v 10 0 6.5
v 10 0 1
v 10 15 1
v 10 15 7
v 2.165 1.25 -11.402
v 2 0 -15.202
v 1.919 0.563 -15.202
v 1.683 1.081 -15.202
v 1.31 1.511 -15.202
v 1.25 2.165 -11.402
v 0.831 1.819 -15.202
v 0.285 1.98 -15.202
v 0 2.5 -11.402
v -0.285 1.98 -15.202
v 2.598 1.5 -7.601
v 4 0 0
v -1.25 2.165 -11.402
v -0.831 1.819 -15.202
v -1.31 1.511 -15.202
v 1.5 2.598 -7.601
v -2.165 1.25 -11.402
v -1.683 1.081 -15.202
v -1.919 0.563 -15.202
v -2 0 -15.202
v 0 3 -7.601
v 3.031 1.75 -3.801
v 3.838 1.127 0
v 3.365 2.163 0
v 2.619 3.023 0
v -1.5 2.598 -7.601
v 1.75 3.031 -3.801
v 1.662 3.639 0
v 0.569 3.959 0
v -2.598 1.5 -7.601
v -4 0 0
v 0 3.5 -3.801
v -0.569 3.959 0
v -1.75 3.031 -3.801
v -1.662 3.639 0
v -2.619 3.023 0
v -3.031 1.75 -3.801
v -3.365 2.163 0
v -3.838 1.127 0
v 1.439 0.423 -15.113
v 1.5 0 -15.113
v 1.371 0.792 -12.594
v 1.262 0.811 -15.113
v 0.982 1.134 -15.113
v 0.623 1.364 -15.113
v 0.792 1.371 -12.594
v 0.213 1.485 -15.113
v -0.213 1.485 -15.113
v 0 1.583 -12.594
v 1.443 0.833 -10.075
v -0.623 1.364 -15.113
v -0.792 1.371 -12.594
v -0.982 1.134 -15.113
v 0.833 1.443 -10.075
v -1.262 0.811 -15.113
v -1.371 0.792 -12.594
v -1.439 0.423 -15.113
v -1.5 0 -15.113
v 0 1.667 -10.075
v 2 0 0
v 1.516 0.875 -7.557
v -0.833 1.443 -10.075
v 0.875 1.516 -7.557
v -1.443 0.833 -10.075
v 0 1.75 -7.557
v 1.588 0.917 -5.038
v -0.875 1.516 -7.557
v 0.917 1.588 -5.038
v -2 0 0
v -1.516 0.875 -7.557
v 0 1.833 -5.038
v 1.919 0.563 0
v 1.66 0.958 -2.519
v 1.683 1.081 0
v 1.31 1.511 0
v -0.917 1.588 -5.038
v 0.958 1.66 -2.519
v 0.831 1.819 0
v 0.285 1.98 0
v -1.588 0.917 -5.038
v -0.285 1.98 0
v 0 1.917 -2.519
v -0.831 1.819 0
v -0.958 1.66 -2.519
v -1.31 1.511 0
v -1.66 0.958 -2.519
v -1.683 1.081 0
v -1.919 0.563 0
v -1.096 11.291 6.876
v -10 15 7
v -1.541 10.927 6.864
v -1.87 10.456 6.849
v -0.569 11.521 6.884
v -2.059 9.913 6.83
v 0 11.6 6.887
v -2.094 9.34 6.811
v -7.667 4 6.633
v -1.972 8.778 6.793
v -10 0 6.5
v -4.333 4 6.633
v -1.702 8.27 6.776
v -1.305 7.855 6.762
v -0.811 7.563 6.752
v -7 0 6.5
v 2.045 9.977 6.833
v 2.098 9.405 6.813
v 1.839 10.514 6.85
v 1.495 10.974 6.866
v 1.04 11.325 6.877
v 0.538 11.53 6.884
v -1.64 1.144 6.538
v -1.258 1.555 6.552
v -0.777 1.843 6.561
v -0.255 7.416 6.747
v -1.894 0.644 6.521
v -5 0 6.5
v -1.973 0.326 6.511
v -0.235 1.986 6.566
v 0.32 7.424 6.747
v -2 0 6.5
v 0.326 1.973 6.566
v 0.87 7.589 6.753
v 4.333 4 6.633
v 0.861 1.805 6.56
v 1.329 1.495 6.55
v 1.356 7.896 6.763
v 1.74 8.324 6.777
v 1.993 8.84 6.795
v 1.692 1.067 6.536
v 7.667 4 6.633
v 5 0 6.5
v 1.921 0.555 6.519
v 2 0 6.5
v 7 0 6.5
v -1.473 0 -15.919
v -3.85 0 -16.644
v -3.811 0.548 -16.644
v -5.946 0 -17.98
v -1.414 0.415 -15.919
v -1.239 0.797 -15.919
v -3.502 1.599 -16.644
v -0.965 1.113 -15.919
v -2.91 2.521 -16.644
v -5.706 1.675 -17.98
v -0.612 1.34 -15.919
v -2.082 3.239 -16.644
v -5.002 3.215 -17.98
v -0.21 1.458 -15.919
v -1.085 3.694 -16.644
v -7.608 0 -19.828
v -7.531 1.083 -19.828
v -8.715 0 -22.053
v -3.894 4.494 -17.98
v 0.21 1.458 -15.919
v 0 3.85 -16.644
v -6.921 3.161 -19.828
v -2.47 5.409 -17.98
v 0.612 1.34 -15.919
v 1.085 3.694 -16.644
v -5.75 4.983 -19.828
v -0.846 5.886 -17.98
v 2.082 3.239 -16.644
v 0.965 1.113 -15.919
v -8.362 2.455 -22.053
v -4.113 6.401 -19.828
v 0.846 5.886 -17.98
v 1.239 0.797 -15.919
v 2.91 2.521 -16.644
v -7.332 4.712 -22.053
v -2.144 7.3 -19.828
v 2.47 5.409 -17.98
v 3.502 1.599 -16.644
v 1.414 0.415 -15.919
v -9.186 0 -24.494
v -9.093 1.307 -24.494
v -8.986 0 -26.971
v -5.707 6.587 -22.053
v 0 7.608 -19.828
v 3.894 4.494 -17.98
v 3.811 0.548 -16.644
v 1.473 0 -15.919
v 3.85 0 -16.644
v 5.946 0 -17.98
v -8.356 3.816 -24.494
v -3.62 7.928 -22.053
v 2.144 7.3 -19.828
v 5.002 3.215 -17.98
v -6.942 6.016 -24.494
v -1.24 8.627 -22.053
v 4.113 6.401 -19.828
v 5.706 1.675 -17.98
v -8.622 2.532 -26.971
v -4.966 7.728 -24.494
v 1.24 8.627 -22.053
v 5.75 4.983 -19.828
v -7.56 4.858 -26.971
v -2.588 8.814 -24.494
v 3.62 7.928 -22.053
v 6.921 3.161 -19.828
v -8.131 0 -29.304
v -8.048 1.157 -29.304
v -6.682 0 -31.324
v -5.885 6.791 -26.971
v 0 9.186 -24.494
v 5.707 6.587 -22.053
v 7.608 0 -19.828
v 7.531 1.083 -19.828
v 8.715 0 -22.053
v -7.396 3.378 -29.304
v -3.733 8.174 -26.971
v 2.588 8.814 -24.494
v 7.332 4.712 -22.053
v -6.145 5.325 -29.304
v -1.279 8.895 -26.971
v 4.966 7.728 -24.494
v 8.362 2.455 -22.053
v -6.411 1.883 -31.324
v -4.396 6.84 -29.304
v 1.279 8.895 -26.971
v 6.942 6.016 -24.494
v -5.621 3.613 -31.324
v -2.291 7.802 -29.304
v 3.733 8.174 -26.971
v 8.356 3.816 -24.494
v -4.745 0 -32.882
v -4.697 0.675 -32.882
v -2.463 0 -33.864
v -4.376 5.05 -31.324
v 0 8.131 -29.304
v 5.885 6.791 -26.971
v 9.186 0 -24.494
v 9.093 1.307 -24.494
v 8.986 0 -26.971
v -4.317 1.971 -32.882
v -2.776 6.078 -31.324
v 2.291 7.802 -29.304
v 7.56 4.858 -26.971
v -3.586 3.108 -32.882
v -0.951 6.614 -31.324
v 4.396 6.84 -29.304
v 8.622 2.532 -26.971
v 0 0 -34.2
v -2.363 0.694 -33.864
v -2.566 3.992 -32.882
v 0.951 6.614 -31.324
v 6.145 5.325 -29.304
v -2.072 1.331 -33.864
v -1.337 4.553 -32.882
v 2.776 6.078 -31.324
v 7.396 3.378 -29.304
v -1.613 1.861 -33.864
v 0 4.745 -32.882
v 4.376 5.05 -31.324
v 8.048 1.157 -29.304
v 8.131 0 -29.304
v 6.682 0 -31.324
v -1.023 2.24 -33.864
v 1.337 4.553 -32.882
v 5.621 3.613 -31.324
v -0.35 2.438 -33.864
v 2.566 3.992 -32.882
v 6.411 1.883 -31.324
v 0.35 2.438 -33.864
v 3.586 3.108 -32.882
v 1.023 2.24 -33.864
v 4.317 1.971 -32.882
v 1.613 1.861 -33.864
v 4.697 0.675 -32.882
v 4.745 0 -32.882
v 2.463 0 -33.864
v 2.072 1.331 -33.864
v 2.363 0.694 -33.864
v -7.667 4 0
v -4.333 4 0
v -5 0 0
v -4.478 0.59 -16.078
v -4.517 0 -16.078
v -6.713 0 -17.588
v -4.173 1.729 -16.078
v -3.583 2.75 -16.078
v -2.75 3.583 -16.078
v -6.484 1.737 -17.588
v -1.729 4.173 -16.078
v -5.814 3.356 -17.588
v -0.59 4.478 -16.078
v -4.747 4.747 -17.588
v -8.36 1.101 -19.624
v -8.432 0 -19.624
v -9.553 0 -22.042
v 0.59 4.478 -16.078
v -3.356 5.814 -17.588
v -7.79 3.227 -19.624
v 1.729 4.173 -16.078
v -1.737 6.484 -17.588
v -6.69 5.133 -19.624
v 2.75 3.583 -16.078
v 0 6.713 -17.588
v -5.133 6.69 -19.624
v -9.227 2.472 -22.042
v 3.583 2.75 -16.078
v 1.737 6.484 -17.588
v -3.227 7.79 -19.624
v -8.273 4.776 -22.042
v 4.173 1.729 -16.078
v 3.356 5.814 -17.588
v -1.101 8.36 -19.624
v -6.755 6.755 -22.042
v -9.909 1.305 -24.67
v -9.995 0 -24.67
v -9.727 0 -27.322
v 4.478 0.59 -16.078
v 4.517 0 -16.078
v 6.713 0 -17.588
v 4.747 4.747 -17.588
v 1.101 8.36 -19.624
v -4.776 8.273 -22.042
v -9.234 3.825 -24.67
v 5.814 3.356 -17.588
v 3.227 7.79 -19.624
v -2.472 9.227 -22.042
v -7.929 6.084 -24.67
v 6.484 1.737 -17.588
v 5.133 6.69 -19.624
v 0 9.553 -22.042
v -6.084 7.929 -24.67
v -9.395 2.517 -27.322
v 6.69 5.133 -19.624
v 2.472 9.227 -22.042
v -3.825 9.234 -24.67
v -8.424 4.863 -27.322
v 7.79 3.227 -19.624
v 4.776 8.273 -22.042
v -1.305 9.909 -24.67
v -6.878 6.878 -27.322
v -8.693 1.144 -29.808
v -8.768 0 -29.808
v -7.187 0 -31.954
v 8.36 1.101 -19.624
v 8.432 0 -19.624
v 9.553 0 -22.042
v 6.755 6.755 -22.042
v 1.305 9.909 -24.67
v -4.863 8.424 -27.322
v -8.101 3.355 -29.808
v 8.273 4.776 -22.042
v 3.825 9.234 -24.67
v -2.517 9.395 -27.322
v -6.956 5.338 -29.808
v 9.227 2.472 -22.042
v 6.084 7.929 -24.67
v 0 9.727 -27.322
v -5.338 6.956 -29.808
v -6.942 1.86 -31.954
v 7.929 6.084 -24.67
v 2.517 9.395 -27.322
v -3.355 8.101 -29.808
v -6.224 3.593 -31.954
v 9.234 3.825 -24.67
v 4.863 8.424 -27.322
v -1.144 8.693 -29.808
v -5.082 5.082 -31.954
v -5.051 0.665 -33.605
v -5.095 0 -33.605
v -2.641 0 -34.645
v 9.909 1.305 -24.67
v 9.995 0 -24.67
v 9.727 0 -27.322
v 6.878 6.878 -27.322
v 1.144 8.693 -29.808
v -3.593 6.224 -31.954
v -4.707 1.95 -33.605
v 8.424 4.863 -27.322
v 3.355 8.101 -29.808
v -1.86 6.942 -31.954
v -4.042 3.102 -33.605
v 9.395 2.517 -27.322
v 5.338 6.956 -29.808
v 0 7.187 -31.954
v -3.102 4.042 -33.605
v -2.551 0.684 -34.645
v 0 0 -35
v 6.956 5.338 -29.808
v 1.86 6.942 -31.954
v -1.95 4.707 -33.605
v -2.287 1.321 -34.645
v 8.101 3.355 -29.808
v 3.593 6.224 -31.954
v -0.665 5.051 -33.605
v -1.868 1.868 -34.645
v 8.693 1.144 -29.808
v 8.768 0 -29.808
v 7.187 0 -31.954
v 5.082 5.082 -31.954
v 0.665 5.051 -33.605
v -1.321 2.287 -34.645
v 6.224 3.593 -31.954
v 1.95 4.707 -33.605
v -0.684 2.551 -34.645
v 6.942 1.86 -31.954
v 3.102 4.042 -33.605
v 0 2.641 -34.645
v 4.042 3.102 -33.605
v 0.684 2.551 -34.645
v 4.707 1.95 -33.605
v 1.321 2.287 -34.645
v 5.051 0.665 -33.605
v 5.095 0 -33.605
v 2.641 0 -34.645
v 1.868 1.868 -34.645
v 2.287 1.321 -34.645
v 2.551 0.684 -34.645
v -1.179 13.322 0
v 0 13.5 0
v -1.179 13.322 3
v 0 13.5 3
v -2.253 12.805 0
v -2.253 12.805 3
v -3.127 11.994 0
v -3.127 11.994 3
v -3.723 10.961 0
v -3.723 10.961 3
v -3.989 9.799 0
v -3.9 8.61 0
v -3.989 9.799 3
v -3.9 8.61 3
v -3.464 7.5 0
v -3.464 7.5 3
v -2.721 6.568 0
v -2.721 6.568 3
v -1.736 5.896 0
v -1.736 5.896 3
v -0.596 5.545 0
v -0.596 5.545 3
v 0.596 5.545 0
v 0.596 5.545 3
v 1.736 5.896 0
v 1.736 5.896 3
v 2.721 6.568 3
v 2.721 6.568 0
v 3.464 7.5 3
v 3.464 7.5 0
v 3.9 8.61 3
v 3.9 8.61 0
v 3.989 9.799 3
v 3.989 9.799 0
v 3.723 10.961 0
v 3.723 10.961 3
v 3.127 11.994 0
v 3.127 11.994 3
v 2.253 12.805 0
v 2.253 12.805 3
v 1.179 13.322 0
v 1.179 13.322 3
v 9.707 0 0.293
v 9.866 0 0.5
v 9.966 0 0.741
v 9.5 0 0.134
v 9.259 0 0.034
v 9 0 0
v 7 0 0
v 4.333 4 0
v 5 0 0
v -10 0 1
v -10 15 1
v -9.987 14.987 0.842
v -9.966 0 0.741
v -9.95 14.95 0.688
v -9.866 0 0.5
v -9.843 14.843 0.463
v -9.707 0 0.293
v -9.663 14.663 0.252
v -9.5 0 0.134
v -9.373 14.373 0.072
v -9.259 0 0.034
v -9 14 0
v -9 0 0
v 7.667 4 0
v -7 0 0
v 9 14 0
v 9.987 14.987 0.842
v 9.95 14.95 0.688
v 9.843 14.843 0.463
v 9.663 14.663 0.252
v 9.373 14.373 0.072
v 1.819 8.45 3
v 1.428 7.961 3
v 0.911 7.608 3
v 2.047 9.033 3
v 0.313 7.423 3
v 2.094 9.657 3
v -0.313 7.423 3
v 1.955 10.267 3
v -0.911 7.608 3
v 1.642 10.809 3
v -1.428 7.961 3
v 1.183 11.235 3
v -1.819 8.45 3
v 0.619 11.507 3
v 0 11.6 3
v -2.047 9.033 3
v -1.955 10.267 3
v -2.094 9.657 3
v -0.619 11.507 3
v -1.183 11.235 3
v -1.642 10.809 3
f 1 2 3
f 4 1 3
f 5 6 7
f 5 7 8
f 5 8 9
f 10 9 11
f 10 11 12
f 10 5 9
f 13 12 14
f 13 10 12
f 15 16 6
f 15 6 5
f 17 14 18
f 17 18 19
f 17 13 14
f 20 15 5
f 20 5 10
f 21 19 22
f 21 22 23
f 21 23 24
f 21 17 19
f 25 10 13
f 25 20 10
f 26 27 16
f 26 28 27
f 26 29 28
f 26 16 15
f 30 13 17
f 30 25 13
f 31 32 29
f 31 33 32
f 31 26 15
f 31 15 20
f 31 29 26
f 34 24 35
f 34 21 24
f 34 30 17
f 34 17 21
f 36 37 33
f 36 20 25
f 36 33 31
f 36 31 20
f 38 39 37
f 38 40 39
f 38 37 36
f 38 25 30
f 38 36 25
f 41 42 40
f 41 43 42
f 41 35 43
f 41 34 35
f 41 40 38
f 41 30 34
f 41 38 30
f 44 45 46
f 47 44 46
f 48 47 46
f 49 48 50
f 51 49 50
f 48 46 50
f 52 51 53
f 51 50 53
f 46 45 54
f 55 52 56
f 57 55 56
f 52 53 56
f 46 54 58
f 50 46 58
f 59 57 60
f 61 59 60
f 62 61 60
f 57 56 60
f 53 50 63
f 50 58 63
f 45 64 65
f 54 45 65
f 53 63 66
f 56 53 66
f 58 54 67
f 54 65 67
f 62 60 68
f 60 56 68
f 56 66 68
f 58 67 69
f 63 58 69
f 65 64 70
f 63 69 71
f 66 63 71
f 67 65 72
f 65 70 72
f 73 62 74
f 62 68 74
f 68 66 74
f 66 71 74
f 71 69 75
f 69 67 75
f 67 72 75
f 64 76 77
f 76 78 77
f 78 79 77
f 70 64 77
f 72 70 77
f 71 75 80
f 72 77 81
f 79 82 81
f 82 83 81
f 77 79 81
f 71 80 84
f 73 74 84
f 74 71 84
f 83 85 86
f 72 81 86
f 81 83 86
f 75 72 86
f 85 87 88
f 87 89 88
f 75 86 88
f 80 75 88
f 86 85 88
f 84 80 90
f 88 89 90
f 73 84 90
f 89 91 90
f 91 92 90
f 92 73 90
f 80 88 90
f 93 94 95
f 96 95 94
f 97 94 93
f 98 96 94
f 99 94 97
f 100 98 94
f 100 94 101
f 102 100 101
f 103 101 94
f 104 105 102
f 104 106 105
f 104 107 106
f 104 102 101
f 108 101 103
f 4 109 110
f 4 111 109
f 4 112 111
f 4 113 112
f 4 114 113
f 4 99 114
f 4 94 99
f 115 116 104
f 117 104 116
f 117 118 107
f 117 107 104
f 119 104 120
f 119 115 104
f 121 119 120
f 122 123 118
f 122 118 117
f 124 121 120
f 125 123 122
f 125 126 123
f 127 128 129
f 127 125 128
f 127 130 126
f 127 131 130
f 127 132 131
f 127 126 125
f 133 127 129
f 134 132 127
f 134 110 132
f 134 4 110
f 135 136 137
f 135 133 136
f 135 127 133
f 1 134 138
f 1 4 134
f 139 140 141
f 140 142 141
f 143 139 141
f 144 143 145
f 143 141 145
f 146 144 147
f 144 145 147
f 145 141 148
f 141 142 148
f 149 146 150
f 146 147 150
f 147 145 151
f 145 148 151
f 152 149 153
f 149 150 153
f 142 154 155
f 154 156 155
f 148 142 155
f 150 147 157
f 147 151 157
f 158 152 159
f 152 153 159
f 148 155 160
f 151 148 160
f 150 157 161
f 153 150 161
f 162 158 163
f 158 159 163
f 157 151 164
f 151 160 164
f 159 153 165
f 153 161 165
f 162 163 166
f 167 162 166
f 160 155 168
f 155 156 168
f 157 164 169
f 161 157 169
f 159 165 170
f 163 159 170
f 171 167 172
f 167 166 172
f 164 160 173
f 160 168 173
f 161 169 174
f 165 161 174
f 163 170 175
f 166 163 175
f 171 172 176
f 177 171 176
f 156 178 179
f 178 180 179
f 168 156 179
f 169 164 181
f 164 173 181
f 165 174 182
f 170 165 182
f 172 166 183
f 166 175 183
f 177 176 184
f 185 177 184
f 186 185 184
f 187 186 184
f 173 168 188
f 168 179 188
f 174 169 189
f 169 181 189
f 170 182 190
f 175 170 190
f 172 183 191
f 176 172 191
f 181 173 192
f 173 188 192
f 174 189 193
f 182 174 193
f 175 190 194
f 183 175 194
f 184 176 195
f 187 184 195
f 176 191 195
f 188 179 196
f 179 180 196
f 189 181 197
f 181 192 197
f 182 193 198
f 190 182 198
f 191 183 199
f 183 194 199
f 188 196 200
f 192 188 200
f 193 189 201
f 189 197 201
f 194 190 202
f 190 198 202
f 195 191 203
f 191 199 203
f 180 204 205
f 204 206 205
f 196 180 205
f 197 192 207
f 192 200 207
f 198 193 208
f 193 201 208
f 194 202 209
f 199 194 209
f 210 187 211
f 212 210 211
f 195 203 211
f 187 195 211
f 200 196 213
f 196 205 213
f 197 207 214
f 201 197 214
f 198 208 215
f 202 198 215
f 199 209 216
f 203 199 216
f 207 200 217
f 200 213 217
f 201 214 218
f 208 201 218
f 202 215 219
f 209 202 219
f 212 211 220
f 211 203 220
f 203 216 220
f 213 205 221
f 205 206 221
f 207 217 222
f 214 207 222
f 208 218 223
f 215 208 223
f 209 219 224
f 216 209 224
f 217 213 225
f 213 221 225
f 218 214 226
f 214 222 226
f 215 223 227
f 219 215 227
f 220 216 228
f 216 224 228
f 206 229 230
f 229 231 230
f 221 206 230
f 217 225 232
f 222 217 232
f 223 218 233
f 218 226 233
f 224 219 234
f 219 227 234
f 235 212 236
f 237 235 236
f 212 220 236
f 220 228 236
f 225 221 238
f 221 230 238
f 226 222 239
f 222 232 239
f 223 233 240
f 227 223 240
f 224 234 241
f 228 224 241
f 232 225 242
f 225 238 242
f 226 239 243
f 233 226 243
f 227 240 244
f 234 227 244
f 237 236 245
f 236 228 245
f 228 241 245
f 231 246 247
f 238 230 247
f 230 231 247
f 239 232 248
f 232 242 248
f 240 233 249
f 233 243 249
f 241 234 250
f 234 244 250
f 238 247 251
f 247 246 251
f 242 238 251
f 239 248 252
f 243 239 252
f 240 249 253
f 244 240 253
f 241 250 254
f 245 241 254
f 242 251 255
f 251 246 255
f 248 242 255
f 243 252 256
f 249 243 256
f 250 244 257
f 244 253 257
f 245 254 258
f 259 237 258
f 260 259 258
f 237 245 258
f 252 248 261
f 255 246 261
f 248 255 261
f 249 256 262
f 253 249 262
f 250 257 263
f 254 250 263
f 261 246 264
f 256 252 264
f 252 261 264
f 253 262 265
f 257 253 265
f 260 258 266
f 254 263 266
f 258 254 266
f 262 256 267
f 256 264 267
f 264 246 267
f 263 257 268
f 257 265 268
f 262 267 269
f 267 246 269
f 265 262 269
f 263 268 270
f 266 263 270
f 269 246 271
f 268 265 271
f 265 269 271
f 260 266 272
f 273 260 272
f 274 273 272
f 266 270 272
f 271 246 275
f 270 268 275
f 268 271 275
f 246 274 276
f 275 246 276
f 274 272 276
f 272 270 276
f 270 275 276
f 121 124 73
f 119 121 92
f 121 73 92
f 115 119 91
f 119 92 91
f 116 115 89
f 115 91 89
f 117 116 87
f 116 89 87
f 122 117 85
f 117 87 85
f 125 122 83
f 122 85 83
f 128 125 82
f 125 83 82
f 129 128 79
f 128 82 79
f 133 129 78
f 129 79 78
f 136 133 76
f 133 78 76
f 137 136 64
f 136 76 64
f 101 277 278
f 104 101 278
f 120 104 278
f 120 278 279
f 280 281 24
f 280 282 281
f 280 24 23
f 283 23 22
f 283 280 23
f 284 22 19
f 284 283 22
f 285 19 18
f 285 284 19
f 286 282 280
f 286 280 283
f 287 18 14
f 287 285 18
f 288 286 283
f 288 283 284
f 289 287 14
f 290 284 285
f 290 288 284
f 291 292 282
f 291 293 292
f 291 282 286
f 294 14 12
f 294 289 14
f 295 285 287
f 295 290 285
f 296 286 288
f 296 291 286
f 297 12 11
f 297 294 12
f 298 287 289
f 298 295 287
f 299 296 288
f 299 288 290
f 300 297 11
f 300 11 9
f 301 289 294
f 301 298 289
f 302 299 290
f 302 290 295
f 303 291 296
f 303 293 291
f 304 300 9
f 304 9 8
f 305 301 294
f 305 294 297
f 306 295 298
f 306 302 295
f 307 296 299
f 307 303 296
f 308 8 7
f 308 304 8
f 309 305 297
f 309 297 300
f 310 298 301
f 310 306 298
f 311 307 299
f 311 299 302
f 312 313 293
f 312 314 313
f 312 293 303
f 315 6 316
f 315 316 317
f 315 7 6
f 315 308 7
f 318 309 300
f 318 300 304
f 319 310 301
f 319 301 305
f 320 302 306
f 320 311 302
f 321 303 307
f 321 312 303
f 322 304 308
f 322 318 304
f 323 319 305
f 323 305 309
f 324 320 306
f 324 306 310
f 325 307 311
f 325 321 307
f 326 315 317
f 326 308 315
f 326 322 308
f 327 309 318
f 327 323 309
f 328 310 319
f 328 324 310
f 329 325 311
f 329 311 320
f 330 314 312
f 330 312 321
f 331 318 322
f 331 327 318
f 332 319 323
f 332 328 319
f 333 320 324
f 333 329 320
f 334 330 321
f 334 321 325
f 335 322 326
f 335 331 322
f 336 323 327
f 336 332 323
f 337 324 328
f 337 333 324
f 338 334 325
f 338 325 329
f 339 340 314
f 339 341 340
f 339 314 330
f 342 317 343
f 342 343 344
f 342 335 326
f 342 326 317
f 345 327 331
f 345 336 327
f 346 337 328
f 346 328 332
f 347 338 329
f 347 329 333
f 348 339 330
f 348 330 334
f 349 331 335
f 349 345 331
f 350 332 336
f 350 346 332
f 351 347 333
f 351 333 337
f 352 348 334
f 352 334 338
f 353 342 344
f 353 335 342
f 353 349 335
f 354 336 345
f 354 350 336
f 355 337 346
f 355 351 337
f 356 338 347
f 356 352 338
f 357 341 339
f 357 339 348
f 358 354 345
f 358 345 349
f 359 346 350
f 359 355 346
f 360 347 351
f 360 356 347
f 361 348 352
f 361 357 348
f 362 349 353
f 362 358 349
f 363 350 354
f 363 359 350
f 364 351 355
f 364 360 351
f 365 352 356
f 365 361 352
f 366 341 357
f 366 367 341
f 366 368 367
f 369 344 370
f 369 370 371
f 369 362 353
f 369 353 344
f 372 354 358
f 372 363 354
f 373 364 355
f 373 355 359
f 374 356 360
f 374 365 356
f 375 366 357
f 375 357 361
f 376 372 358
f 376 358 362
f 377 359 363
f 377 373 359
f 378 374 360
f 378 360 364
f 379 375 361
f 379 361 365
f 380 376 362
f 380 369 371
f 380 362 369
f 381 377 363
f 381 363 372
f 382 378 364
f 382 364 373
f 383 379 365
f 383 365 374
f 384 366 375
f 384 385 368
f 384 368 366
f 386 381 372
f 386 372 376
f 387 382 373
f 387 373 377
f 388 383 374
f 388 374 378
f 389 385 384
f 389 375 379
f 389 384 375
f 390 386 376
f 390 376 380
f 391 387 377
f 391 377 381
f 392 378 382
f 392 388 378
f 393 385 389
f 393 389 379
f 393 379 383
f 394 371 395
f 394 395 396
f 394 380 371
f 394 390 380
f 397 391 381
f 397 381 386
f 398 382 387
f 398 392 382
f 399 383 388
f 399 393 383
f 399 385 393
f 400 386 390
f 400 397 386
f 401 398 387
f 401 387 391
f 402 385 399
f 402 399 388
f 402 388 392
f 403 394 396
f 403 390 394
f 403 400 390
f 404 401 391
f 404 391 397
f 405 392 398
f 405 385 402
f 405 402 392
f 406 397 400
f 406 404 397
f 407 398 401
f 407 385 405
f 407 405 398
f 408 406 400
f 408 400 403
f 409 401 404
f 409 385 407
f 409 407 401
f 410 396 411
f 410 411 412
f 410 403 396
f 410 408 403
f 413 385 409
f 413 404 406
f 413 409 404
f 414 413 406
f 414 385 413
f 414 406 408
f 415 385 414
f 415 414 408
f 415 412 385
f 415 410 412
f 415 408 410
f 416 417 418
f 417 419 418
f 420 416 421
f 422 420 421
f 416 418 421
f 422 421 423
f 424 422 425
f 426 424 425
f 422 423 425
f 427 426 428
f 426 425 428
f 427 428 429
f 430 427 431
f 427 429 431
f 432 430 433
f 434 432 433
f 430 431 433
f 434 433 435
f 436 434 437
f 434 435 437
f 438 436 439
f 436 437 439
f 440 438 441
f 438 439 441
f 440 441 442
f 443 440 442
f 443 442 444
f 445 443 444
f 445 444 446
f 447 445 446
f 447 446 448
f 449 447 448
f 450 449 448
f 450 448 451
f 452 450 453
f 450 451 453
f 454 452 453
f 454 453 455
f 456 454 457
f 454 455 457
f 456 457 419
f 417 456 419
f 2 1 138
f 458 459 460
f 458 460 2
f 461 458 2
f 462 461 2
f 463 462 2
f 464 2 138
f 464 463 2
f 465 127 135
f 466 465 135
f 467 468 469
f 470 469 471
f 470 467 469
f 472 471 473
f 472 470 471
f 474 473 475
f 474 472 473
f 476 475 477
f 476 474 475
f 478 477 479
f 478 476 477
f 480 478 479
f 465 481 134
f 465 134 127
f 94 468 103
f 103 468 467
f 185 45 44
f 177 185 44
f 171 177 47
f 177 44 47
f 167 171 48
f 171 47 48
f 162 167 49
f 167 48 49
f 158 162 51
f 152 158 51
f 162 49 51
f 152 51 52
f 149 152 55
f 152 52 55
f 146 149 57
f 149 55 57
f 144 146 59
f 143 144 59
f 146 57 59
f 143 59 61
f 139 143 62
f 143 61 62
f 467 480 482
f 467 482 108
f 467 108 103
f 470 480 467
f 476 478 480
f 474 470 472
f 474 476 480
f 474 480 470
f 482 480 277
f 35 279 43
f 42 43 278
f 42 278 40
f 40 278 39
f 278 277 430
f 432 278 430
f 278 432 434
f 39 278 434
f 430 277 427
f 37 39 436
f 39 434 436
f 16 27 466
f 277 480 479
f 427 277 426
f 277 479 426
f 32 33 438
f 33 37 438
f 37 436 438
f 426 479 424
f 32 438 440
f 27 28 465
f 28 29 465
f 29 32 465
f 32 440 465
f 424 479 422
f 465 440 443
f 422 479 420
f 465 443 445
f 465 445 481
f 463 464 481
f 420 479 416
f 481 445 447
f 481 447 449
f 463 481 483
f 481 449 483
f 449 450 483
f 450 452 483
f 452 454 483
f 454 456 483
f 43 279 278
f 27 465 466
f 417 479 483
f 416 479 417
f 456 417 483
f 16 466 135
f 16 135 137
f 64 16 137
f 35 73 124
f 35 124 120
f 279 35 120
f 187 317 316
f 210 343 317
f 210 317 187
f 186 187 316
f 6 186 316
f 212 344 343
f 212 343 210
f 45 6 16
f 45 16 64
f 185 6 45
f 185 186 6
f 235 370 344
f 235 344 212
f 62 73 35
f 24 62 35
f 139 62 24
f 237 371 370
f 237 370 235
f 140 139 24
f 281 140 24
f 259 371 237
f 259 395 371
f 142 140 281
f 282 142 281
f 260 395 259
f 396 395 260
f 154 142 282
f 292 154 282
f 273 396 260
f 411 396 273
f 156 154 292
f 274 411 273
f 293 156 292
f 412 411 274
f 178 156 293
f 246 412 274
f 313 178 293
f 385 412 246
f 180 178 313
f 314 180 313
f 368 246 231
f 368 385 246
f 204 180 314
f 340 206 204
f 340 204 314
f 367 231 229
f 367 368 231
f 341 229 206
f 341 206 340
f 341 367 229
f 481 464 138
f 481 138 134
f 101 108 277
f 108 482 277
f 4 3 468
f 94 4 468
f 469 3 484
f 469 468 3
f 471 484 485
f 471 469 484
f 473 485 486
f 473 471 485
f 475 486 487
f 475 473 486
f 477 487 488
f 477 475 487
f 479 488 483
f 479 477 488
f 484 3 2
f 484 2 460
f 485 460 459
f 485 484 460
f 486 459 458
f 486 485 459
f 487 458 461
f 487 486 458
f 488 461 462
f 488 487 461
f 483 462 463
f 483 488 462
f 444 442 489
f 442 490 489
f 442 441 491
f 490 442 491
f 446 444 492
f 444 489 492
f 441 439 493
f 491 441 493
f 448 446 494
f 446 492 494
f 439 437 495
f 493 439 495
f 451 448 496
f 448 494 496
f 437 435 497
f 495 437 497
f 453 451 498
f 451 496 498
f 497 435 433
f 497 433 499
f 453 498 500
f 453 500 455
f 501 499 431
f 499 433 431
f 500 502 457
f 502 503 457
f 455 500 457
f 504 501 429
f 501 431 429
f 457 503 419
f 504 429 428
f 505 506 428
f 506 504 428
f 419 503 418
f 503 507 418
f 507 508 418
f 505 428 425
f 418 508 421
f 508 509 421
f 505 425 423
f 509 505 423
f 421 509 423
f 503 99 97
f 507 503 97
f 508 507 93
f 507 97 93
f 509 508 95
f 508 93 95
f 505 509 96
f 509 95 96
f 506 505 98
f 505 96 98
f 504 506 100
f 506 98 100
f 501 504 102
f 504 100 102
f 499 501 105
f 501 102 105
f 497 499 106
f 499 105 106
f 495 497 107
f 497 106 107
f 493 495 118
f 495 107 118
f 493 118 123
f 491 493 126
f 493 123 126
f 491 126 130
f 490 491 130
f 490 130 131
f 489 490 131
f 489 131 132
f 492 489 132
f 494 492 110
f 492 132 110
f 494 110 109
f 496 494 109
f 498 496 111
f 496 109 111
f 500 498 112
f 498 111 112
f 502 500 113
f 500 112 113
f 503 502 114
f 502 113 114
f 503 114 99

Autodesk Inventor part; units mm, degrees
ref_plane "YZ Plane" through (0, 0, 0) normal (1, 0, 0) x (0, 1, 0)
ref_plane "XZ Plane" through (0, 0, 0) normal (0, 1, 0) x (-1, 0, 0)
ref_plane "XY Plane" through (0, 0, 0) normal (0, 0, 1) x (1, 0, 0)
sketch "Sketch1" plane through (0, 0, 0) normal (0, 1, 0) x (-1, 0, 0)
  line L0 (0, 0) -> (-2, 0)
  line L1 (-2, 0) -> (-4, 0)
  line L2 (0, 0) -> (0, -15)
  line L3 (0, -15) -> (0, -25)
  circle A0 centre (0, -25) radius 10
  line L4 (-1.5, -15.1131) -> (0, -15.1131)
  line L5 (0, -15.1131) -> (0, -15)
  line L6 (-1.5, -15) -> (-1.5, -15.1131)
  line L7 (-1.5, -15.1131) -> (-2, 0)
  line L8 (0, -15) -> (-1.5, -15)
  line L9 (-1.5, -15) -> (-2, -15)
  line L10 (-2, -15) -> (-2, -15.202)
  line L11 (-2, -15.202) -> (-4, 0)
  line L12 (0, -25) -> (0, -35)
  circle A1 centre (0, -25) radius 9.2
  line L13 (-1.5, -15.1131) -> (-1.4733, -15.9187)
  point P0 (0, -34.2)
  dimension "d7" = 18.4
  dimension "d2" = 15
  dimension "d4" = 10
  dimension "d6" = 0.5
  dimension "d10" = 1.5
  dimension "d11" = 2
  dimension "d12" = 2
revolve "Revolution1" add sketch "Sketch1" angle 180 about axis through (0, 0, 0) along (0, 0, 1) contours L7 L9 L10 L11 L1 | L7 A0 L10 L9 | L13 A1 L12 A0
sketch "Sketch2" plane through (0, 0, 0) normal (0, 0, 1) x (1, 0, 0)
  line L0 (5, 0) -> (-5, 0)
  line L1 (-14, 0) -> (14, 0) projected
  arc A0 (2, 0) -> (-2, 0) centre (0, 0) ccw projected
  line L2 (0, 0) -> (0, 16) construction
  line L3 (-10, 0) -> (10, 0)
  line L4 (10, 0) -> (10, 15)
  line L5 (10, 15) -> (-10, 15)
  line L6 (-10, 15) -> (-10, 0)
  point P0 (0, 0)
  point P1 (0, 0)
  point P2 (-10, 0)
  point P3 (10, 0)
  dimension "d29" = 20
  dimension "d33" = 15
  dimension "d34" = 15
extrude "Base" add sketch "Sketch2" along normal blind 7 contours L0 A0 L1 L6 L5 L4
sketch "Sketch3" plane through (0, 0, 0) normal (0, 0, -1) x (-1, 0, 0)
  line L0 (0, -3) -> (0, 18) projected
  line L1 (-10, 15) -> (10, 15) projected
  point P0 (0, 0)
  point P1 (0, 9.5)
  dimension "d30" = 5.5
hole "Screw Hole" at (0, 9.5, 0) direction (0, 0, 1) diameter 4.2 end through all counterbore diameter 8 counterbore depth 3
sketch "Sketch4" plane through (0, 0, 0) normal (0, 0, -1) x (-1, 0, 0)
  line L0 (-2, 0) -> (-10, 0) projected
  line L1 (0, 0) -> (0, -2) construction
  line L2 (6, 0) -> (6, 6)
  line L3 (6, 6) -> (8, 6)
  line L4 (6, 6) -> (4, 6)
  line L5 (4, 6) -> (5, 0)
  line L6 (7, 0) -> (8, 6)
  line L7 (7, 0) -> (5, 0)
  line L8 (10, 0) -> (2, 0) projected
  line L9 (6, 0) -> (6, 4)
  line L10 (7.6667, 4) -> (4.3333, 4)
  line L11 (0, 0) -> (0, 18)
  line L12 (10, 0) -> (4, 0) projected
  line L13 (-6, 0) -> (-6, 6)
  line L14 (-6, 6) -> (-8, 6)
  line L15 (-6, 6) -> (-4, 6)
  line L16 (-4, 6) -> (-5, 0)
  line L17 (-7, 0) -> (-8, 6)
  line L18 (-7, 0) -> (-5, 0)
  line L19 (-6, 0) -> (-6, 4)
  line L20 (-7.6667, 4) -> (-4.3333, 4)
  point P0 (5, 0)
  point P1 (-5, 0)
  point P2 (-5, 0)
extrude "Keyway" cut sketch "Sketch4" against normal through all contours L0 L13 L20 L16 | L0 L17 L20 L13 | L7 L5 L10 L2 | L2 L10 L6 L7
sketch "Sketch5" plane through (10, 0, 0) normal (1, 0, 0) x (0, 0, -1)
  line L0 (0, 15) -> (-7, 15) projected
  line L1 (0, 15) -> (-7, 15) projected
  line L2 (0, 0) -> (-7, 0) projected
  line L3 (-7, 15) -> (-7, 0) projected
  line L4 (-7, 15) -> (-7, 0)
  line L5 (-7, 0) -> (-6.5, 0)
  line L6 (-7, 15) -> (-6.5, 0)
  dimension "d37" = 0.5
extrude "Taper" cut sketch "Sketch5" against normal through all
fillet "Fillet1" radius 1 3 edges at (-10, 7.5, 0) (0, 15, 0) (10, 7.5, 0)
equation "\"d34\" = d33"
properties part number "markerWithRodEnd_3DPrint"
